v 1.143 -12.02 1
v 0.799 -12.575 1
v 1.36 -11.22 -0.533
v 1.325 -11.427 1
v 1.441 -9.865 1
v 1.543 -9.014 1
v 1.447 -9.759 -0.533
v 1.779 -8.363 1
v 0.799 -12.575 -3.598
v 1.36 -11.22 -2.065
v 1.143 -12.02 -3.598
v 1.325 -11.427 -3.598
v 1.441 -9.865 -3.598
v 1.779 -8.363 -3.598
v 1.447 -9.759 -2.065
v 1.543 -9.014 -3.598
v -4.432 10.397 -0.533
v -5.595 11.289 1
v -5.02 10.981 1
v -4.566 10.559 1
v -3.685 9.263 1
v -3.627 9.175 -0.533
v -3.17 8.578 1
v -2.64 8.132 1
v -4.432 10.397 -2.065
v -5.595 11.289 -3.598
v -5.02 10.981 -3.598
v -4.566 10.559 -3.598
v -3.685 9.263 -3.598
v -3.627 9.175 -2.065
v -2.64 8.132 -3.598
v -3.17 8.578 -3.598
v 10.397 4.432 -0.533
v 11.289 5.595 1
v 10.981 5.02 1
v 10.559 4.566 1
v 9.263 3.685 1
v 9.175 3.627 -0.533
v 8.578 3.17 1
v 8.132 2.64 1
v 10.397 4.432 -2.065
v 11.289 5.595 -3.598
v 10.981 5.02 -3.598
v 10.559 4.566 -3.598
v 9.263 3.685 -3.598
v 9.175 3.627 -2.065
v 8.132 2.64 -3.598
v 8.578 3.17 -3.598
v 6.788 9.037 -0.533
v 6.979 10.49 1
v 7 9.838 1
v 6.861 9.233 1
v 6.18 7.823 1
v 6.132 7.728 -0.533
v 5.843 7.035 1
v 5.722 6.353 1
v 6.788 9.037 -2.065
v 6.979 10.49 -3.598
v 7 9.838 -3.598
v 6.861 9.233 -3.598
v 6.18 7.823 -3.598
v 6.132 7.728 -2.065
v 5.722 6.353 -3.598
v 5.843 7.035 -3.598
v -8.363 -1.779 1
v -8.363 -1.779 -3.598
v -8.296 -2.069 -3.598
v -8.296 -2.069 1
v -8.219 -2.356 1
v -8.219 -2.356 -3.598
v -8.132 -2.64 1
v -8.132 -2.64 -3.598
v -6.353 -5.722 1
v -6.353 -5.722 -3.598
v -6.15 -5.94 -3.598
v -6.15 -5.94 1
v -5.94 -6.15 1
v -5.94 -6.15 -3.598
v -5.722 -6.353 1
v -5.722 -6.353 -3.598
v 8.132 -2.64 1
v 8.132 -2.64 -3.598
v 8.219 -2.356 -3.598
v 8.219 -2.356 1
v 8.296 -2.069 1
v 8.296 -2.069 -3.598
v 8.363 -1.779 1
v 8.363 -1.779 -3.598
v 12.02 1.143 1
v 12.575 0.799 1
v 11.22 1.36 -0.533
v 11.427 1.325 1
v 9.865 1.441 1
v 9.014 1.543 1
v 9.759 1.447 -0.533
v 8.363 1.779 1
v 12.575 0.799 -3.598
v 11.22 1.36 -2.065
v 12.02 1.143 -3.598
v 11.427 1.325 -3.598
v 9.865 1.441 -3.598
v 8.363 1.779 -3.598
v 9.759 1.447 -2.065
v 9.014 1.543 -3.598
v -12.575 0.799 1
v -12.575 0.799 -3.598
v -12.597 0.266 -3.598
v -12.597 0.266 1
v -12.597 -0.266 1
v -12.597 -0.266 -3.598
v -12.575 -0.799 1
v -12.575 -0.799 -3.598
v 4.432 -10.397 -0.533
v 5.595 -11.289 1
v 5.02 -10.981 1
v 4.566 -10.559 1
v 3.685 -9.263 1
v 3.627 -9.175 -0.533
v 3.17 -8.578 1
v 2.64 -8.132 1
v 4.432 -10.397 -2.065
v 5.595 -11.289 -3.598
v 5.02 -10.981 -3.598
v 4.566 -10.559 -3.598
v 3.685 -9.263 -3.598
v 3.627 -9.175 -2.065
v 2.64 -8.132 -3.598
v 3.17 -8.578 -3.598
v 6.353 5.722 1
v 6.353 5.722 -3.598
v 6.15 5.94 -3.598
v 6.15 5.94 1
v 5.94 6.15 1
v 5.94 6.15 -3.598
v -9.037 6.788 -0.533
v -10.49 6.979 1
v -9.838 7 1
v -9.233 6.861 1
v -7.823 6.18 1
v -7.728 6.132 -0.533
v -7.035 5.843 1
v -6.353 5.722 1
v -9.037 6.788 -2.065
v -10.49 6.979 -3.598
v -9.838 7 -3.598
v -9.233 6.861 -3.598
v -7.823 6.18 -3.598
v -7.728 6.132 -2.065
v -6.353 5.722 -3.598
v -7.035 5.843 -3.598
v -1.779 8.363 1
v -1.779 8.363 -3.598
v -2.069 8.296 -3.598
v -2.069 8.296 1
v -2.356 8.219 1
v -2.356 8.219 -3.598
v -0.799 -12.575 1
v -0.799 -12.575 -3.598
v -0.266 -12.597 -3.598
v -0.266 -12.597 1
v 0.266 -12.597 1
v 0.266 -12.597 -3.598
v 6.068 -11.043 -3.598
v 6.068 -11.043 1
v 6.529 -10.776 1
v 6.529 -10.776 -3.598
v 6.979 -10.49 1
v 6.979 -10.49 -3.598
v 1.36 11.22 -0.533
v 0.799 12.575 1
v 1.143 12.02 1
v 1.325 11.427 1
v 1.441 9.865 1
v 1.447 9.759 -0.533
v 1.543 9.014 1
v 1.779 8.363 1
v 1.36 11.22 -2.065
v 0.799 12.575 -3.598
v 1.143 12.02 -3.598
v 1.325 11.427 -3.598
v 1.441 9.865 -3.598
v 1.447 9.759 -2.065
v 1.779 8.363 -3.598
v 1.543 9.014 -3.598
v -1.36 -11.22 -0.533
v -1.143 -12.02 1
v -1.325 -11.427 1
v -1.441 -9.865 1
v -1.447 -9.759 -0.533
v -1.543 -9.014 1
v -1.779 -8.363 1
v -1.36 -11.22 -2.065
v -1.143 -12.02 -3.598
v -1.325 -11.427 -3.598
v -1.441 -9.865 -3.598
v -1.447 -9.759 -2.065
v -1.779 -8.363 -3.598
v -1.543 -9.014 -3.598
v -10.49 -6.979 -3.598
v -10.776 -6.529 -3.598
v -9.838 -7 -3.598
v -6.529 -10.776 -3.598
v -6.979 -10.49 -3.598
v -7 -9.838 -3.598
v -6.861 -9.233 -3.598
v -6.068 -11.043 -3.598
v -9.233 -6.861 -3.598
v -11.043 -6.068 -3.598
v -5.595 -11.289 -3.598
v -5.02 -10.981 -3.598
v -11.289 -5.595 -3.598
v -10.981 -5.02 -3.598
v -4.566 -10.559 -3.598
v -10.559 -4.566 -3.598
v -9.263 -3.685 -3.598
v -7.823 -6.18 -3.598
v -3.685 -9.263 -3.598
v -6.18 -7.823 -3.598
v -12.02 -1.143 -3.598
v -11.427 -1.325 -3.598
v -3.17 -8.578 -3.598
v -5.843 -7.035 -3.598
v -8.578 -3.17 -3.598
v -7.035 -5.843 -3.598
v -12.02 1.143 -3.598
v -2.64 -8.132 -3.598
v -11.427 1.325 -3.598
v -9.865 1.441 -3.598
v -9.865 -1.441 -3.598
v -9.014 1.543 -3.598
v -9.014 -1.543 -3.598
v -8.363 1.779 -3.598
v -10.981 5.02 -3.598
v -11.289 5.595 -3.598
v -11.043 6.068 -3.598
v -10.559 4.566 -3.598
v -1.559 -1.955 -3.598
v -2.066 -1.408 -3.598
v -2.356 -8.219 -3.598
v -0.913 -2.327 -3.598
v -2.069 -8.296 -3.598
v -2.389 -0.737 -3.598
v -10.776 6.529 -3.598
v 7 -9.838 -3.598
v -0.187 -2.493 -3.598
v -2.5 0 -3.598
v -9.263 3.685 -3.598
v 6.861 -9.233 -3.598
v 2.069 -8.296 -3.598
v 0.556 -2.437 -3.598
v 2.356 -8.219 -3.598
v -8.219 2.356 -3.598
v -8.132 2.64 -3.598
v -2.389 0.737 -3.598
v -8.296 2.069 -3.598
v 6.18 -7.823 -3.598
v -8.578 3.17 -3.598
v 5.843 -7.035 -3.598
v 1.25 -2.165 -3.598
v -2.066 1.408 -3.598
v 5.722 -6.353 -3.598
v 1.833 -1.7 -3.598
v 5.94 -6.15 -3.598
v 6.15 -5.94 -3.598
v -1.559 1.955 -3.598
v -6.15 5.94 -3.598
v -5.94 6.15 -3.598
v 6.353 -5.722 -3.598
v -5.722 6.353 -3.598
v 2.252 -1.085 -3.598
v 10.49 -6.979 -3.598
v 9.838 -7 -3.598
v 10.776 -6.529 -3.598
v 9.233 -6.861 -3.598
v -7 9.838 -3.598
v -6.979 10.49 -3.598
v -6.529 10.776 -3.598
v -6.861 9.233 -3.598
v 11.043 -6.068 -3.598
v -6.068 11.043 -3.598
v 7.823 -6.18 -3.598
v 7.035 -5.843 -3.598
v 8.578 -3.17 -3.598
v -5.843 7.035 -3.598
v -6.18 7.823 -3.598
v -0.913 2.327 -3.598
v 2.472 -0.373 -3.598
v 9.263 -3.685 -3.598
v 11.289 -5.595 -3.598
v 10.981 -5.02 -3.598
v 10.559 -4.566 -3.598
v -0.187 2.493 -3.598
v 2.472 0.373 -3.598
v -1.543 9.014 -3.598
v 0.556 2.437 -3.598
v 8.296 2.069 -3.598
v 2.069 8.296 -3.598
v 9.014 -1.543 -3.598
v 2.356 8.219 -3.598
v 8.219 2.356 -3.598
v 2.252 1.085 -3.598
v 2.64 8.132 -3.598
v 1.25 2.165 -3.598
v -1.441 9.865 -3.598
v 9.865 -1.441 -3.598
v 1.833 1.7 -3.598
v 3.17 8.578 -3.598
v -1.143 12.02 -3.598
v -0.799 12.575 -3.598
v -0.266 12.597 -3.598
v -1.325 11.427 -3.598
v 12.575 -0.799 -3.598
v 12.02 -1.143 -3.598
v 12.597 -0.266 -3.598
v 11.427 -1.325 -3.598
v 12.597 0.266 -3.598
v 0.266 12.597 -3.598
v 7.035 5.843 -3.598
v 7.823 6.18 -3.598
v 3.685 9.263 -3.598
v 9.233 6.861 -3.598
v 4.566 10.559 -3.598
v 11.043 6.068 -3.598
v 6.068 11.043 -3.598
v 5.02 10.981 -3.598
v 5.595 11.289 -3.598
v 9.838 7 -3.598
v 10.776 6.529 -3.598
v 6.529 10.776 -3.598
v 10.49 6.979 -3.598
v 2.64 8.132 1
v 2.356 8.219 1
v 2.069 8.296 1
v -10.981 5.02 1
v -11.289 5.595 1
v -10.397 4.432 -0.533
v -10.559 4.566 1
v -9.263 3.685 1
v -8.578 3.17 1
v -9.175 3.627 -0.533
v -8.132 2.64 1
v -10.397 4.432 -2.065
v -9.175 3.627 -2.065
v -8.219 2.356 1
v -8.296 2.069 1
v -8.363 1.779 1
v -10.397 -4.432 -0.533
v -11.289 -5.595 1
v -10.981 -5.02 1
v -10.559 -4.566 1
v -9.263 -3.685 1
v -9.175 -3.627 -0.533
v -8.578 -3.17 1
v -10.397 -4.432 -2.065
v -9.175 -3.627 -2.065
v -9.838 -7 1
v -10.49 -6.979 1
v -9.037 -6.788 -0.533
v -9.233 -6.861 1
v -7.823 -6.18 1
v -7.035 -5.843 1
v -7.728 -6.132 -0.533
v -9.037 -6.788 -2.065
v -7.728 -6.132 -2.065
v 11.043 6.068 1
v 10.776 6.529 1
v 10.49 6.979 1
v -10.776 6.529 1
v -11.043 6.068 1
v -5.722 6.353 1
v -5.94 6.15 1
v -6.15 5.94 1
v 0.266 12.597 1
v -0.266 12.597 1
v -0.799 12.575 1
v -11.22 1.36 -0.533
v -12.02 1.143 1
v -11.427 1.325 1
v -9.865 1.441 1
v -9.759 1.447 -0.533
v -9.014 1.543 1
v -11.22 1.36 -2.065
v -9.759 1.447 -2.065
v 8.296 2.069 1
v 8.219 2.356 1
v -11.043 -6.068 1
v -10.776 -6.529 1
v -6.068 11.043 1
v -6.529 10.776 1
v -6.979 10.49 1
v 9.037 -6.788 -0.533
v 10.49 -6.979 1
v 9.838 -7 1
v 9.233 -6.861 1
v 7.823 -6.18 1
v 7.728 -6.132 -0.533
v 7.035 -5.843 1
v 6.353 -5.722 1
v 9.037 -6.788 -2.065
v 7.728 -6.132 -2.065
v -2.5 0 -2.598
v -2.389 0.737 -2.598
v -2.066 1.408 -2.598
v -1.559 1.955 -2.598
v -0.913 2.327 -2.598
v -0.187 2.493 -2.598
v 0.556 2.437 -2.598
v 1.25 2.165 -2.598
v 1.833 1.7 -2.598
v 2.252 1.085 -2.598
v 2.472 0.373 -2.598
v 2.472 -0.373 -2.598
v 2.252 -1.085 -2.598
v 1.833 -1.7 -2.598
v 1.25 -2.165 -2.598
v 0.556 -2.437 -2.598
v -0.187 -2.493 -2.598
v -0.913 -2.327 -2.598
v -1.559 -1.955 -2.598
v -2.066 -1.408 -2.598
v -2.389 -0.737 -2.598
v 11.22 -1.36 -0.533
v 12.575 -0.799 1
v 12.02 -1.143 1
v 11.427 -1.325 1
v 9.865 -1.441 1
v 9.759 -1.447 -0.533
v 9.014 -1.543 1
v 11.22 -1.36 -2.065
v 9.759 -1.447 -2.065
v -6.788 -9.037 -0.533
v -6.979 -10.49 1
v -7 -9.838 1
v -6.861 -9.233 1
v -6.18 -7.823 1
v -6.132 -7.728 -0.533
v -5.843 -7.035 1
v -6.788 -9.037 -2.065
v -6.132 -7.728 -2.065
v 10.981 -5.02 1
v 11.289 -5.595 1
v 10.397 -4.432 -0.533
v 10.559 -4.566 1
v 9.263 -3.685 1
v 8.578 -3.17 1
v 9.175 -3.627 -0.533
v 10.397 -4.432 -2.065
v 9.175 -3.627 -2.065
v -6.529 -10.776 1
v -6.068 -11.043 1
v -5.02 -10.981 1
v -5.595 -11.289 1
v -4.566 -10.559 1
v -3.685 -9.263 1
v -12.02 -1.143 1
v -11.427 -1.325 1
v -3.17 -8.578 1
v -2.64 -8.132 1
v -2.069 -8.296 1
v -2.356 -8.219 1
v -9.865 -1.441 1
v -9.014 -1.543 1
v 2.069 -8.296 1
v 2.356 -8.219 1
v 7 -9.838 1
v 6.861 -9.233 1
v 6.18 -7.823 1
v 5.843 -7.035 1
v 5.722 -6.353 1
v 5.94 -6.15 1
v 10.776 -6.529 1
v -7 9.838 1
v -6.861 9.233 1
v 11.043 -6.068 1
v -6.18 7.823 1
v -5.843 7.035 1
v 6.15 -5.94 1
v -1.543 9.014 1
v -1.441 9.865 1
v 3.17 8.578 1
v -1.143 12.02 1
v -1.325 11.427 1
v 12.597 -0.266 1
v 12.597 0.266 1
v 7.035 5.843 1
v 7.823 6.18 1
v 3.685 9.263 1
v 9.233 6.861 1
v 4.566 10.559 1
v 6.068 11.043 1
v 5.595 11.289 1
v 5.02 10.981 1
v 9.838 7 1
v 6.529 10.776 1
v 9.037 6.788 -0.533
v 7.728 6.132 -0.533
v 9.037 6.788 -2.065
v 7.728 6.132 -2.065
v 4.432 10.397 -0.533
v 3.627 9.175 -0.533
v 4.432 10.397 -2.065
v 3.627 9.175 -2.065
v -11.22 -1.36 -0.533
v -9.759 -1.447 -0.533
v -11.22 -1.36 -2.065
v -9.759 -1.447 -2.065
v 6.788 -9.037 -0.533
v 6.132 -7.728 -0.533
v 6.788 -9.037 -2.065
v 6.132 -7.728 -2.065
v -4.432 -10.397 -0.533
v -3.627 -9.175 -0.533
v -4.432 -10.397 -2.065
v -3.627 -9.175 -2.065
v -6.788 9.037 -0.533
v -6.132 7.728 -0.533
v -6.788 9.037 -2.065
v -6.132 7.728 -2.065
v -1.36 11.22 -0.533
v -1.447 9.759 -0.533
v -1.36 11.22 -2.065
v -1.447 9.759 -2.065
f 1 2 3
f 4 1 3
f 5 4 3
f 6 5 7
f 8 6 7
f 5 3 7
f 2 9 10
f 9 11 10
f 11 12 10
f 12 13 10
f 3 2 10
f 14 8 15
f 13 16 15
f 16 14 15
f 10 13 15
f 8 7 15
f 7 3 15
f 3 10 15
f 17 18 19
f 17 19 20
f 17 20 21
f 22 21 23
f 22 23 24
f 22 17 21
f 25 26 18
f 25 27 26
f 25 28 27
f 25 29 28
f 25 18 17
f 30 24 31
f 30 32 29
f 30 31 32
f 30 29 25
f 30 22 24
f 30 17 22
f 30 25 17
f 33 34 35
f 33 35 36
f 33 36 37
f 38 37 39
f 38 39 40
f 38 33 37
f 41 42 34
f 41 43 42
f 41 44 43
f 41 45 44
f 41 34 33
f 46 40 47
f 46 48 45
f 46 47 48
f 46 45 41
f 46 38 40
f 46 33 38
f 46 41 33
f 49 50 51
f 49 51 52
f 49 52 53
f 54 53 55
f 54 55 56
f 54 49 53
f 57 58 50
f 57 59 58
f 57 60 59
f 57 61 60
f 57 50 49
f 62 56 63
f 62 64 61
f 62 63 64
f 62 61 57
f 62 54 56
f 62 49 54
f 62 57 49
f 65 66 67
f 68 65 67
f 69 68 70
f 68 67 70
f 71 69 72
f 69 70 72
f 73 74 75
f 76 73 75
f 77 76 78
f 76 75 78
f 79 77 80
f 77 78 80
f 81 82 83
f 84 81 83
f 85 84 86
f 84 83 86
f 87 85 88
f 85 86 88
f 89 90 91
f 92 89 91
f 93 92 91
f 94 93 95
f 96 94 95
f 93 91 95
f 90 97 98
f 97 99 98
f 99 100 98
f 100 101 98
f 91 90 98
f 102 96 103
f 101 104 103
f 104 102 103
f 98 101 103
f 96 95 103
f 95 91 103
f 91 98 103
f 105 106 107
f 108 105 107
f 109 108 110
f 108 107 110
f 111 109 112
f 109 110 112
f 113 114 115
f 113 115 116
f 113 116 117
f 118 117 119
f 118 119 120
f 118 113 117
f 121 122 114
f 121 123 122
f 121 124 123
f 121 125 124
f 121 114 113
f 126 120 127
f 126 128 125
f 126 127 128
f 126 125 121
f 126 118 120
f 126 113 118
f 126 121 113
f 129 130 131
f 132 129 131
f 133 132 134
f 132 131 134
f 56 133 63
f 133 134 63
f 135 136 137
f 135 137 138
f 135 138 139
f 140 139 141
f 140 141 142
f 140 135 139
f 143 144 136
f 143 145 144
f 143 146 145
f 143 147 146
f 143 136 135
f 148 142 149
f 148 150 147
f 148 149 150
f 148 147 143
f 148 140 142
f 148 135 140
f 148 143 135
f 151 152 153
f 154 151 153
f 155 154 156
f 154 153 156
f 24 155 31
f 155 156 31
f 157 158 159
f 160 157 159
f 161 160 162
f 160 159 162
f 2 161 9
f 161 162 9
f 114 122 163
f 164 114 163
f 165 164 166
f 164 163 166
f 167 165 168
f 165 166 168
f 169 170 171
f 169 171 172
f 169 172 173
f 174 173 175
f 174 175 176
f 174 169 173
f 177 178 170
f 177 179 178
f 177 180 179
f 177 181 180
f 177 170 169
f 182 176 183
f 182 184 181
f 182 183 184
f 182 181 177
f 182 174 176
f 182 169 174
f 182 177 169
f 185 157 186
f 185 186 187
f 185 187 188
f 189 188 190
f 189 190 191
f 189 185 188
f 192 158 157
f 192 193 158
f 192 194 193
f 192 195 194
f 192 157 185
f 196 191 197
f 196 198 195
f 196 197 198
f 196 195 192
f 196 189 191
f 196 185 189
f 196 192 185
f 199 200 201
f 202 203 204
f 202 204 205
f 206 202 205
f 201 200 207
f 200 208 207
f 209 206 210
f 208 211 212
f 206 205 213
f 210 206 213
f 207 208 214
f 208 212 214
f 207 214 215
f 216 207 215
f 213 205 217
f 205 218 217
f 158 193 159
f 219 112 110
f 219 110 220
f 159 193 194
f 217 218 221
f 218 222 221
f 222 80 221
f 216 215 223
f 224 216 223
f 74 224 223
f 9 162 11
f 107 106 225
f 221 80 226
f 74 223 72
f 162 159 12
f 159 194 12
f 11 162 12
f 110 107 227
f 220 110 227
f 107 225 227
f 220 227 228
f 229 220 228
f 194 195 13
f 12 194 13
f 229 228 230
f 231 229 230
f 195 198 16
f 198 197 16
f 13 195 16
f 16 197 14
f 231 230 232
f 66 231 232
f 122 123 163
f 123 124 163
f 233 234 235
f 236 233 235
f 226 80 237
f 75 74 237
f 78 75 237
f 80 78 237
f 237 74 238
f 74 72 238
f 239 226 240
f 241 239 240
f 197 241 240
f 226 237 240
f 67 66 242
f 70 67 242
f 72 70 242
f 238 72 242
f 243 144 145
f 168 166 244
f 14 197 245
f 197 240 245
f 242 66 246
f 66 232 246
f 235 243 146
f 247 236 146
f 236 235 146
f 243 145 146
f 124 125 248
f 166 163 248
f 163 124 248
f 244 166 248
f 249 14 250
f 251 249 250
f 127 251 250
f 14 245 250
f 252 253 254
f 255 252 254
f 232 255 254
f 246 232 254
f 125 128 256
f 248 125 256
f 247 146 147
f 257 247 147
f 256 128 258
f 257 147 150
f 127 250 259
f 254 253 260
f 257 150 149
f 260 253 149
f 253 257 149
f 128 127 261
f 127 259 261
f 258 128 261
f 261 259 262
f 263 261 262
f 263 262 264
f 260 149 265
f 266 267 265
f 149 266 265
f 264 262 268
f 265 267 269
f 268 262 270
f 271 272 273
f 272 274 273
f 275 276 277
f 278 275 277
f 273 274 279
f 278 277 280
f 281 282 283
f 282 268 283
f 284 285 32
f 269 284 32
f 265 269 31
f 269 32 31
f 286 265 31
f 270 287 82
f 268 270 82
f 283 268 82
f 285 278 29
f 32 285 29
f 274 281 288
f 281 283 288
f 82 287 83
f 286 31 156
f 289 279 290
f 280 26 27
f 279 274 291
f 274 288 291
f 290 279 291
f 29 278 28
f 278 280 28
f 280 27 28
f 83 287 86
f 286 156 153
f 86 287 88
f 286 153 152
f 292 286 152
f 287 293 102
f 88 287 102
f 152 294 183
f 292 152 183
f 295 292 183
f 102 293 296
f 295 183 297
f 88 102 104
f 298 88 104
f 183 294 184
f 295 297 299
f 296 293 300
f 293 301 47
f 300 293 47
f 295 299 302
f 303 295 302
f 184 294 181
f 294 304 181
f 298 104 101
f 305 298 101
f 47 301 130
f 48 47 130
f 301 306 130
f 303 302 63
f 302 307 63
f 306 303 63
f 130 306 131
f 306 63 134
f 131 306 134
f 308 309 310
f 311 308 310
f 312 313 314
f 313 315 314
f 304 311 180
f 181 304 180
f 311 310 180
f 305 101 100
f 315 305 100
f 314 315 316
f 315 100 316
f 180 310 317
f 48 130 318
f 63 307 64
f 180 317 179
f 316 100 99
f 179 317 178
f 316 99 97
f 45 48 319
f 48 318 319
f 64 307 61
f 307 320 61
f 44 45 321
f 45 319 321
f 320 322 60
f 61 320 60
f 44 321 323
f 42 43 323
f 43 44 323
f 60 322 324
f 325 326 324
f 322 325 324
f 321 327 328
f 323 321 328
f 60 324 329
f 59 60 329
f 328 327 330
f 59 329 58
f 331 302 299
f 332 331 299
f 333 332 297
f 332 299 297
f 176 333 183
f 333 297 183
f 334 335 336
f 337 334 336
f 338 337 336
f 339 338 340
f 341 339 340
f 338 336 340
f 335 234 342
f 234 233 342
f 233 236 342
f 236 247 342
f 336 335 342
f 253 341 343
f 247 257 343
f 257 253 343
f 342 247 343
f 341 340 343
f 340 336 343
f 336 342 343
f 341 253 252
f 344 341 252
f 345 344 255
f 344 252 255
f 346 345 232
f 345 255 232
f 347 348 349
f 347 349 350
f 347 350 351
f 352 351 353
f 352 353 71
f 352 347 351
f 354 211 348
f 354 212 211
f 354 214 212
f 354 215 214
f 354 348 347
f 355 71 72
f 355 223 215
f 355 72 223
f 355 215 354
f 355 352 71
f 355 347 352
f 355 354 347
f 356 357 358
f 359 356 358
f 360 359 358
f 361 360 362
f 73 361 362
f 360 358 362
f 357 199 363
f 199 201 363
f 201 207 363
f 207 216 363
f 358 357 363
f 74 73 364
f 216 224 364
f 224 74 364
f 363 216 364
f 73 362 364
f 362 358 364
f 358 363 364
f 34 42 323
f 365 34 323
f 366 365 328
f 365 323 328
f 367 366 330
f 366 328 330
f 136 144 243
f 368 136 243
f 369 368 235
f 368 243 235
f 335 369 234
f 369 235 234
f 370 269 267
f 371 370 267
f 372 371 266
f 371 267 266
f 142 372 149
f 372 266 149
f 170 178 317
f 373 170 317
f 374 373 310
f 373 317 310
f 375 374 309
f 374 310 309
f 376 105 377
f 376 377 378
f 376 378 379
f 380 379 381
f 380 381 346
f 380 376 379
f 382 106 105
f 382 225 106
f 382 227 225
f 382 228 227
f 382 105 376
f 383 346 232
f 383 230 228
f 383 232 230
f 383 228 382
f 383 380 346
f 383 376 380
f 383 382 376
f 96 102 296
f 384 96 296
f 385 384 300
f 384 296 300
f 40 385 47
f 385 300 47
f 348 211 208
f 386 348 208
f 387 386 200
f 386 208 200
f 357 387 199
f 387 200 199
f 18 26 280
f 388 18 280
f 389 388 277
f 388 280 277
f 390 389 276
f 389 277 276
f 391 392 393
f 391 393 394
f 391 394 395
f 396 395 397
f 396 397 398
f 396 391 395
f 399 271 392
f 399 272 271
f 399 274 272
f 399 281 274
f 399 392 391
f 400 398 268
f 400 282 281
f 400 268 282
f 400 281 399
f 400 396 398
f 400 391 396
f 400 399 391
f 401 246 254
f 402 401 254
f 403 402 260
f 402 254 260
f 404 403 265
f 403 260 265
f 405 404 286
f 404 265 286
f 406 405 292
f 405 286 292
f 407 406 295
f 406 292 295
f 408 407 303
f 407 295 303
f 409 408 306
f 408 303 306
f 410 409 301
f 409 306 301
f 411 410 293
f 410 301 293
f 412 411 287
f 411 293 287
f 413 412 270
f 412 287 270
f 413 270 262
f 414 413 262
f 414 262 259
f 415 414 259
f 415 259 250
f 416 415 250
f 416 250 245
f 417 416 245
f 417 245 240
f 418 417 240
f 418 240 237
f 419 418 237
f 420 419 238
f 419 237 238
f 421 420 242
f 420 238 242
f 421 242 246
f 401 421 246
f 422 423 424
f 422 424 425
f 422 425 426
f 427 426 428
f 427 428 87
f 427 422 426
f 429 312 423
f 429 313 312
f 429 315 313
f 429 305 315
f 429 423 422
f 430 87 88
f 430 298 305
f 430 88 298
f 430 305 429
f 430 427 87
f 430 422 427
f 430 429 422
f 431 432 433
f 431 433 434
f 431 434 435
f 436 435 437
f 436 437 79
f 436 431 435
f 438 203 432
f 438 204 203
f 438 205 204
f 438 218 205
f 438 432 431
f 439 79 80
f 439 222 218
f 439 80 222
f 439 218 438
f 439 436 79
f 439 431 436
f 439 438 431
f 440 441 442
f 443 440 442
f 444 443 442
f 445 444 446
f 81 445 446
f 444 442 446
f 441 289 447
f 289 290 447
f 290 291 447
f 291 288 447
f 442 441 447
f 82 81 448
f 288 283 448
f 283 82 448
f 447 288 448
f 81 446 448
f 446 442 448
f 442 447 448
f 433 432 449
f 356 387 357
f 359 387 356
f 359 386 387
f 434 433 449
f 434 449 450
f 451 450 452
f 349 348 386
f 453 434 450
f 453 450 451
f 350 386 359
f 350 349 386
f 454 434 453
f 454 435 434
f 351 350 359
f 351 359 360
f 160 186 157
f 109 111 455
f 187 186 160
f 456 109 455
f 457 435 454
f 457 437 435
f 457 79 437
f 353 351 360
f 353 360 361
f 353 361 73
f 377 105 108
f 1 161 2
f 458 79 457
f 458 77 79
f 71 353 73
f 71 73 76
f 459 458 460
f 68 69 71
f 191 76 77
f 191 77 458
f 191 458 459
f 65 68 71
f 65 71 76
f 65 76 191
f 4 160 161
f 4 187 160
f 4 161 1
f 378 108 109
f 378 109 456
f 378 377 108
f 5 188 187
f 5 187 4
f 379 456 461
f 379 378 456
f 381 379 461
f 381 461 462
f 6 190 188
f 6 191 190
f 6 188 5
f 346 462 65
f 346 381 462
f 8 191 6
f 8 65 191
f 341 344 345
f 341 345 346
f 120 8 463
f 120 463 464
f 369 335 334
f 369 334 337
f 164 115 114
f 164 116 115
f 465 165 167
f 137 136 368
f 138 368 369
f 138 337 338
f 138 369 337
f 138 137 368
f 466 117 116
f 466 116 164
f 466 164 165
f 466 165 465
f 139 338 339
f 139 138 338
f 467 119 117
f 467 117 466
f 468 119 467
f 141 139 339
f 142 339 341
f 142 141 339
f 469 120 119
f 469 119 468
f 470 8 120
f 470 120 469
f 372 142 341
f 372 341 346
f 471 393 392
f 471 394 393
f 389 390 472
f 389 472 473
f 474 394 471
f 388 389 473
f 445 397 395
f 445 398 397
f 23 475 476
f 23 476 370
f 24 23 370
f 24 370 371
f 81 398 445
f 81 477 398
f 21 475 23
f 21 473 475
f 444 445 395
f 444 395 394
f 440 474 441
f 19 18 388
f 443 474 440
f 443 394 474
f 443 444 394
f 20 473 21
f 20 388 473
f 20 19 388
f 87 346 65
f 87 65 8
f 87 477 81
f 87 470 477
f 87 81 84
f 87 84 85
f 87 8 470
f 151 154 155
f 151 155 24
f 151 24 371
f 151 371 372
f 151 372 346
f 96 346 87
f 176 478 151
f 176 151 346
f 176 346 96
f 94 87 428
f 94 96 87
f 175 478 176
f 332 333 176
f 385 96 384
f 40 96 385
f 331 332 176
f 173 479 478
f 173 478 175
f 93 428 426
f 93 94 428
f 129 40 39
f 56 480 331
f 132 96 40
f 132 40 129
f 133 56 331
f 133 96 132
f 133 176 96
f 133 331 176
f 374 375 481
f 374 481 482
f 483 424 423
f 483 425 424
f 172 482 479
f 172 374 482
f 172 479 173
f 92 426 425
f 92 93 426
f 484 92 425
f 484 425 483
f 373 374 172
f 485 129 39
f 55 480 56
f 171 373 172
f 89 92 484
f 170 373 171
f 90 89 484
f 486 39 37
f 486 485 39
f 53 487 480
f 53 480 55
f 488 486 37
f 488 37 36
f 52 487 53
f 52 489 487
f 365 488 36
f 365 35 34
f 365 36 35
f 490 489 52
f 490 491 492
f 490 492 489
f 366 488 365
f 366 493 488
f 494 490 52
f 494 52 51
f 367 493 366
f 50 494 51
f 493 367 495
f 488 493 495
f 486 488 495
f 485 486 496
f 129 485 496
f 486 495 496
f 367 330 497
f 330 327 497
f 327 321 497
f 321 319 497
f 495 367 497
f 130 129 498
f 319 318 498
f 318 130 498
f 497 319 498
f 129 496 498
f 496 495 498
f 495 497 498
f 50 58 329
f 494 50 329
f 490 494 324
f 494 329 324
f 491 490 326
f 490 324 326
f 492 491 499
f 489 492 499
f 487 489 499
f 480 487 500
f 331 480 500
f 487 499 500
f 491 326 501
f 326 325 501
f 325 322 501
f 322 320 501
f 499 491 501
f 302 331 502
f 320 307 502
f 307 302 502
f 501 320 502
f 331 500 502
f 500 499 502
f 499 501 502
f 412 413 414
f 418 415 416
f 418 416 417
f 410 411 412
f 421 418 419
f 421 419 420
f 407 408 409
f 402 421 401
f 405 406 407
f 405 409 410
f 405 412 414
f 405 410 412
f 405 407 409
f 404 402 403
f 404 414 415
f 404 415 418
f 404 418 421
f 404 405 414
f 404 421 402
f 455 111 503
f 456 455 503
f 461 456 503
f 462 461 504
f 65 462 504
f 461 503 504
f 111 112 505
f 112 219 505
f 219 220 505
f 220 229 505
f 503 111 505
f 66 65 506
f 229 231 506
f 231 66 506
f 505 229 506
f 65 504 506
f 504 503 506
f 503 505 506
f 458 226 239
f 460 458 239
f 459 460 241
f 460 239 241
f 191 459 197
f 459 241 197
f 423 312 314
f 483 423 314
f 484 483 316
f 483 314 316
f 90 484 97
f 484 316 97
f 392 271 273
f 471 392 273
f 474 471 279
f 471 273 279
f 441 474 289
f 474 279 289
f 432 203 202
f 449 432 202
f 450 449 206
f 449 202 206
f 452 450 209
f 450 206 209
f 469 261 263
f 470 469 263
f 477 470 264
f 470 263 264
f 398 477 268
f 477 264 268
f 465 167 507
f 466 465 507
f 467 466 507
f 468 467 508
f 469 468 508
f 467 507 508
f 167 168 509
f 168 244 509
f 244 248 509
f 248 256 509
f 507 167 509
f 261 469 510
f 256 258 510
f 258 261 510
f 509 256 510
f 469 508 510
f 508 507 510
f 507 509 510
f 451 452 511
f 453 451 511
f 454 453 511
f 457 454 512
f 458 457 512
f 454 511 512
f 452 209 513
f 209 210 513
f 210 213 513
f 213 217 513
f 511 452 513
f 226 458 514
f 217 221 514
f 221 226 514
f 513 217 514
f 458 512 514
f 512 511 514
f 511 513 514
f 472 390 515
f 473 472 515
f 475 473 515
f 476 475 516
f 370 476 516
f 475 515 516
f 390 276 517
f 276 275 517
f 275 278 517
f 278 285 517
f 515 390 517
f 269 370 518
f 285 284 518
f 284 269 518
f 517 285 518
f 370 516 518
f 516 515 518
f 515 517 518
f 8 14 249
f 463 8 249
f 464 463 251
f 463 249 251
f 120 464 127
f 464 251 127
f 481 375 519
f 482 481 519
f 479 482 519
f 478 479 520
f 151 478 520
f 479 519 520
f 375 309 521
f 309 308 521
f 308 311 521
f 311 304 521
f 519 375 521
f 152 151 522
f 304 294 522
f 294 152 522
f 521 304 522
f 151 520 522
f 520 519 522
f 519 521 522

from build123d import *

# Parameters (mm, degrees)
EXTRUDE_1_DEPTH      = 1
EXTRUDE_1_DEPTH_BACK = 3.597865908
SKETCH_2_R           = 2.5
CUT_EXTRUDE_1_DEPTH  = 1


with BuildPart() as part:
    # 草图1 → 凸台-拉伸1 (new, two sides: drawn at the far end of the back side and taken through both)
    with BuildSketch(Plane.XY.offset(-EXTRUDE_1_DEPTH_BACK)):
        with BuildLine():
            ThreePointArc((-2.640449702, -8.132067718), (-2.212902836, -8.258665815), (-1.779337339, -8.36280208))
            add(Edge.make_bspline(
                [(-0.798942675, -12.574644751), (-1.838065444, -11.330781503), (-1.08287755, -9.669464778), (-1.779337339, -8.36280208)],
                knots=[0, 0, 0, 0, 1, 1, 1, 1], degree=3))
            ThreePointArc((-0.798942675, -12.574644751), (0, -12.6), (0.798942675, -12.574644751))
            add(Edge.make_bspline(
                [(0.798942675, -12.574644751), (1.838065444, -11.330781503), (1.08287755, -9.669464778), (1.779337339, -8.36280208)],
                knots=[0, 0, 0, 0, 1, 1, 1, 1], degree=3))
            ThreePointArc((1.779337339, -8.36280208), (2.212902836, -8.258665815), (2.640449702, -8.132067718))
            add(Edge.make_bspline(
                [(5.595417723, -11.289433135), (4.073579383, -10.731777349), (3.896932922, -8.915440914), (2.640449702, -8.132067718)],
                knots=[0, 0, 0, 0, 1, 1, 1, 1], degree=3))
            ThreePointArc((5.595417723, -11.289433135), (6.3, -10.911920088), (6.979227028, -10.49049046))
            add(Edge.make_bspline(
                [(6.979227028, -10.49049046), (7.25720212, -8.893711904), (5.772531856, -7.832563364), (5.722352378, -6.352730379)],
                knots=[0, 0, 0, 0, 1, 1, 1, 1], degree=3))
            ThreePointArc((5.722352378, -6.352730379), (6.045762979, -6.045762979), (6.352730379, -5.722352378))
            add(Edge.make_bspline(
                [(10.49049046, -6.979227028), (8.893711904, -7.25720212), (7.832563364, -5.772531856), (6.352730379, -5.722352378)],
                knots=[0, 0, 0, 0, 1, 1, 1, 1], degree=3))
            ThreePointArc((10.49049046, -6.979227028), (10.911920088, -6.3), (11.289433135, -5.595417723))
            add(Edge.make_bspline(
                [(11.289433135, -5.595417723), (10.731777349, -4.073579383), (8.915440914, -3.896932922), (8.132067718, -2.640449702)],
                knots=[0, 0, 0, 0, 1, 1, 1, 1], degree=3))
            ThreePointArc((8.132067718, -2.640449702), (8.258665815, -2.212902836), (8.36280208, -1.779337339))
            add(Edge.make_bspline(
                [(12.574644751, -0.798942675), (11.330781503, -1.838065444), (9.669464778, -1.08287755), (8.36280208, -1.779337339)],
                knots=[0, 0, 0, 0, 1, 1, 1, 1], degree=3))
            ThreePointArc((12.574644751, -0.798942675), (12.6, 0), (12.574644751, 0.798942675))
            add(Edge.make_bspline(
                [(12.574644751, 0.798942675), (11.330781503, 1.838065444), (9.669464778, 1.08287755), (8.36280208, 1.779337339)],
                knots=[0, 0, 0, 0, 1, 1, 1, 1], degree=3))
            ThreePointArc((8.36280208, 1.779337339), (8.258665815, 2.212902836), (8.132067718, 2.640449702))
            add(Edge.make_bspline(
                [(11.289433135, 5.595417723), (10.731777349, 4.073579383), (8.915440914, 3.896932922), (8.132067718, 2.640449702)],
                knots=[0, 0, 0, 0, 1, 1, 1, 1], degree=3))
            ThreePointArc((11.289433135, 5.595417723), (10.911920088, 6.3), (10.49049046, 6.979227028))
            add(Edge.make_bspline(
                [(10.49049046, 6.979227028), (8.893711904, 7.25720212), (7.832563364, 5.772531856), (6.352730379, 5.722352378)],
                knots=[0, 0, 0, 0, 1, 1, 1, 1], degree=3))
            ThreePointArc((6.352730379, 5.722352378), (6.045762979, 6.045762979), (5.722352378, 6.352730379))
            add(Edge.make_bspline(
                [(6.979227028, 10.49049046), (7.25720212, 8.893711904), (5.772531856, 7.832563364), (5.722352378, 6.352730379)],
                knots=[0, 0, 0, 0, 1, 1, 1, 1], degree=3))
            ThreePointArc((6.979227028, 10.49049046), (6.3, 10.911920088), (5.595417723, 11.289433135))
            add(Edge.make_bspline(
                [(5.595417723, 11.289433135), (4.073579383, 10.731777349), (3.896932922, 8.915440914), (2.640449702, 8.132067718)],
                knots=[0, 0, 0, 0, 1, 1, 1, 1], degree=3))
            ThreePointArc((2.640449702, 8.132067718), (2.212902836, 8.258665815), (1.779337339, 8.36280208))
            add(Edge.make_bspline(
                [(0.798942675, 12.574644751), (1.838065444, 11.330781503), (1.08287755, 9.669464778), (1.779337339, 8.36280208)],
                knots=[0, 0, 0, 0, 1, 1, 1, 1], degree=3))
            ThreePointArc((0.798942675, 12.574644751), (0, 12.6), (-0.798942675, 12.574644751))
            add(Edge.make_bspline(
                [(-0.798942675, 12.574644751), (-1.838065444, 11.330781503), (-1.08287755, 9.669464778), (-1.779337339, 8.36280208)],
                knots=[0, 0, 0, 0, 1, 1, 1, 1], degree=3))
            ThreePointArc((-1.779337339, 8.36280208), (-2.212902836, 8.258665815), (-2.640449702, 8.132067718))
            add(Edge.make_bspline(
                [(-5.595417723, 11.289433135), (-4.073579383, 10.731777349), (-3.896932922, 8.915440914), (-2.640449702, 8.132067718)],
                knots=[0, 0, 0, 0, 1, 1, 1, 1], degree=3))
            ThreePointArc((-5.595417723, 11.289433135), (-6.3, 10.911920088), (-6.979227028, 10.49049046))
            add(Edge.make_bspline(
                [(-6.979227028, 10.49049046), (-7.25720212, 8.893711904), (-5.772531856, 7.832563364), (-5.722352378, 6.352730379)],
                knots=[0, 0, 0, 0, 1, 1, 1, 1], degree=3))
            ThreePointArc((-5.722352378, 6.352730379), (-6.045762979, 6.045762979), (-6.352730379, 5.722352378))
            add(Edge.make_bspline(
                [(-10.49049046, 6.979227028), (-8.893711904, 7.25720212), (-7.832563364, 5.772531856), (-6.352730379, 5.722352378)],
                knots=[0, 0, 0, 0, 1, 1, 1, 1], degree=3))
            ThreePointArc((-10.49049046, 6.979227028), (-10.911920088, 6.3), (-11.289433135, 5.595417723))
            add(Edge.make_bspline(
                [(-11.289433135, 5.595417723), (-10.731777349, 4.073579383), (-8.915440914, 3.896932922), (-8.132067718, 2.640449702)],
                knots=[0, 0, 0, 0, 1, 1, 1, 1], degree=3))
            ThreePointArc((-8.132067718, 2.640449702), (-8.258665815, 2.212902836), (-8.36280208, 1.779337339))
            add(Edge.make_bspline(
                [(-12.574644751, 0.798942675), (-11.330781503, 1.838065444), (-9.669464778, 1.08287755), (-8.36280208, 1.779337339)],
                knots=[0, 0, 0, 0, 1, 1, 1, 1], degree=3))
            ThreePointArc((-12.574644751, 0.798942675), (-12.6, 0), (-12.574644751, -0.798942675))
            add(Edge.make_bspline(
                [(-12.574644751, -0.798942675), (-11.330781503, -1.838065444), (-9.669464778, -1.08287755), (-8.36280208, -1.779337339)],
                knots=[0, 0, 0, 0, 1, 1, 1, 1], degree=3))
            ThreePointArc((-8.36280208, -1.779337339), (-8.258665815, -2.212902836), (-8.132067718, -2.640449702))
            add(Edge.make_bspline(
                [(-11.289433135, -5.595417723), (-10.731777349, -4.073579383), (-8.915440914, -3.896932922), (-8.132067718, -2.640449702)],
                knots=[0, 0, 0, 0, 1, 1, 1, 1], degree=3))
            ThreePointArc((-11.289433135, -5.595417723), (-10.911920088, -6.3), (-10.49049046, -6.979227028))
            add(Edge.make_bspline(
                [(-10.49049046, -6.979227028), (-8.893711904, -7.25720212), (-7.832563364, -5.772531856), (-6.352730379, -5.722352378)],
                knots=[0, 0, 0, 0, 1, 1, 1, 1], degree=3))
            ThreePointArc((-6.352730379, -5.722352378), (-6.045762979, -6.045762979), (-5.722352378, -6.352730379))
            add(Edge.make_bspline(
                [(-6.979227028, -10.49049046), (-7.25720212, -8.893711904), (-5.772531856, -7.832563364), (-5.722352378, -6.352730379)],
                knots=[0, 0, 0, 0, 1, 1, 1, 1], degree=3))
            ThreePointArc((-6.979227028, -10.49049046), (-6.3, -10.911920088), (-5.595417723, -11.289433135))
            add(Edge.make_bspline(
                [(-5.595417723, -11.289433135), (-4.073579383, -10.731777349), (-3.896932922, -8.915440914), (-2.640449702, -8.132067718)],
                knots=[0, 0, 0, 0, 1, 1, 1, 1], degree=3))
        make_face()
    extrude(amount=EXTRUDE_1_DEPTH + EXTRUDE_1_DEPTH_BACK)

    # 草图2 → 切除-拉伸1 (cut)
    with BuildSketch(Plane(origin=(0, 0, -3.597865908), x_dir=(-1, 0, 0), z_dir=(0, 0, -1))):
        Circle(SKETCH_2_R)
    extrude(amount=-CUT_EXTRUDE_1_DEPTH, mode=Mode.SUBTRACT)


solid = part.part
